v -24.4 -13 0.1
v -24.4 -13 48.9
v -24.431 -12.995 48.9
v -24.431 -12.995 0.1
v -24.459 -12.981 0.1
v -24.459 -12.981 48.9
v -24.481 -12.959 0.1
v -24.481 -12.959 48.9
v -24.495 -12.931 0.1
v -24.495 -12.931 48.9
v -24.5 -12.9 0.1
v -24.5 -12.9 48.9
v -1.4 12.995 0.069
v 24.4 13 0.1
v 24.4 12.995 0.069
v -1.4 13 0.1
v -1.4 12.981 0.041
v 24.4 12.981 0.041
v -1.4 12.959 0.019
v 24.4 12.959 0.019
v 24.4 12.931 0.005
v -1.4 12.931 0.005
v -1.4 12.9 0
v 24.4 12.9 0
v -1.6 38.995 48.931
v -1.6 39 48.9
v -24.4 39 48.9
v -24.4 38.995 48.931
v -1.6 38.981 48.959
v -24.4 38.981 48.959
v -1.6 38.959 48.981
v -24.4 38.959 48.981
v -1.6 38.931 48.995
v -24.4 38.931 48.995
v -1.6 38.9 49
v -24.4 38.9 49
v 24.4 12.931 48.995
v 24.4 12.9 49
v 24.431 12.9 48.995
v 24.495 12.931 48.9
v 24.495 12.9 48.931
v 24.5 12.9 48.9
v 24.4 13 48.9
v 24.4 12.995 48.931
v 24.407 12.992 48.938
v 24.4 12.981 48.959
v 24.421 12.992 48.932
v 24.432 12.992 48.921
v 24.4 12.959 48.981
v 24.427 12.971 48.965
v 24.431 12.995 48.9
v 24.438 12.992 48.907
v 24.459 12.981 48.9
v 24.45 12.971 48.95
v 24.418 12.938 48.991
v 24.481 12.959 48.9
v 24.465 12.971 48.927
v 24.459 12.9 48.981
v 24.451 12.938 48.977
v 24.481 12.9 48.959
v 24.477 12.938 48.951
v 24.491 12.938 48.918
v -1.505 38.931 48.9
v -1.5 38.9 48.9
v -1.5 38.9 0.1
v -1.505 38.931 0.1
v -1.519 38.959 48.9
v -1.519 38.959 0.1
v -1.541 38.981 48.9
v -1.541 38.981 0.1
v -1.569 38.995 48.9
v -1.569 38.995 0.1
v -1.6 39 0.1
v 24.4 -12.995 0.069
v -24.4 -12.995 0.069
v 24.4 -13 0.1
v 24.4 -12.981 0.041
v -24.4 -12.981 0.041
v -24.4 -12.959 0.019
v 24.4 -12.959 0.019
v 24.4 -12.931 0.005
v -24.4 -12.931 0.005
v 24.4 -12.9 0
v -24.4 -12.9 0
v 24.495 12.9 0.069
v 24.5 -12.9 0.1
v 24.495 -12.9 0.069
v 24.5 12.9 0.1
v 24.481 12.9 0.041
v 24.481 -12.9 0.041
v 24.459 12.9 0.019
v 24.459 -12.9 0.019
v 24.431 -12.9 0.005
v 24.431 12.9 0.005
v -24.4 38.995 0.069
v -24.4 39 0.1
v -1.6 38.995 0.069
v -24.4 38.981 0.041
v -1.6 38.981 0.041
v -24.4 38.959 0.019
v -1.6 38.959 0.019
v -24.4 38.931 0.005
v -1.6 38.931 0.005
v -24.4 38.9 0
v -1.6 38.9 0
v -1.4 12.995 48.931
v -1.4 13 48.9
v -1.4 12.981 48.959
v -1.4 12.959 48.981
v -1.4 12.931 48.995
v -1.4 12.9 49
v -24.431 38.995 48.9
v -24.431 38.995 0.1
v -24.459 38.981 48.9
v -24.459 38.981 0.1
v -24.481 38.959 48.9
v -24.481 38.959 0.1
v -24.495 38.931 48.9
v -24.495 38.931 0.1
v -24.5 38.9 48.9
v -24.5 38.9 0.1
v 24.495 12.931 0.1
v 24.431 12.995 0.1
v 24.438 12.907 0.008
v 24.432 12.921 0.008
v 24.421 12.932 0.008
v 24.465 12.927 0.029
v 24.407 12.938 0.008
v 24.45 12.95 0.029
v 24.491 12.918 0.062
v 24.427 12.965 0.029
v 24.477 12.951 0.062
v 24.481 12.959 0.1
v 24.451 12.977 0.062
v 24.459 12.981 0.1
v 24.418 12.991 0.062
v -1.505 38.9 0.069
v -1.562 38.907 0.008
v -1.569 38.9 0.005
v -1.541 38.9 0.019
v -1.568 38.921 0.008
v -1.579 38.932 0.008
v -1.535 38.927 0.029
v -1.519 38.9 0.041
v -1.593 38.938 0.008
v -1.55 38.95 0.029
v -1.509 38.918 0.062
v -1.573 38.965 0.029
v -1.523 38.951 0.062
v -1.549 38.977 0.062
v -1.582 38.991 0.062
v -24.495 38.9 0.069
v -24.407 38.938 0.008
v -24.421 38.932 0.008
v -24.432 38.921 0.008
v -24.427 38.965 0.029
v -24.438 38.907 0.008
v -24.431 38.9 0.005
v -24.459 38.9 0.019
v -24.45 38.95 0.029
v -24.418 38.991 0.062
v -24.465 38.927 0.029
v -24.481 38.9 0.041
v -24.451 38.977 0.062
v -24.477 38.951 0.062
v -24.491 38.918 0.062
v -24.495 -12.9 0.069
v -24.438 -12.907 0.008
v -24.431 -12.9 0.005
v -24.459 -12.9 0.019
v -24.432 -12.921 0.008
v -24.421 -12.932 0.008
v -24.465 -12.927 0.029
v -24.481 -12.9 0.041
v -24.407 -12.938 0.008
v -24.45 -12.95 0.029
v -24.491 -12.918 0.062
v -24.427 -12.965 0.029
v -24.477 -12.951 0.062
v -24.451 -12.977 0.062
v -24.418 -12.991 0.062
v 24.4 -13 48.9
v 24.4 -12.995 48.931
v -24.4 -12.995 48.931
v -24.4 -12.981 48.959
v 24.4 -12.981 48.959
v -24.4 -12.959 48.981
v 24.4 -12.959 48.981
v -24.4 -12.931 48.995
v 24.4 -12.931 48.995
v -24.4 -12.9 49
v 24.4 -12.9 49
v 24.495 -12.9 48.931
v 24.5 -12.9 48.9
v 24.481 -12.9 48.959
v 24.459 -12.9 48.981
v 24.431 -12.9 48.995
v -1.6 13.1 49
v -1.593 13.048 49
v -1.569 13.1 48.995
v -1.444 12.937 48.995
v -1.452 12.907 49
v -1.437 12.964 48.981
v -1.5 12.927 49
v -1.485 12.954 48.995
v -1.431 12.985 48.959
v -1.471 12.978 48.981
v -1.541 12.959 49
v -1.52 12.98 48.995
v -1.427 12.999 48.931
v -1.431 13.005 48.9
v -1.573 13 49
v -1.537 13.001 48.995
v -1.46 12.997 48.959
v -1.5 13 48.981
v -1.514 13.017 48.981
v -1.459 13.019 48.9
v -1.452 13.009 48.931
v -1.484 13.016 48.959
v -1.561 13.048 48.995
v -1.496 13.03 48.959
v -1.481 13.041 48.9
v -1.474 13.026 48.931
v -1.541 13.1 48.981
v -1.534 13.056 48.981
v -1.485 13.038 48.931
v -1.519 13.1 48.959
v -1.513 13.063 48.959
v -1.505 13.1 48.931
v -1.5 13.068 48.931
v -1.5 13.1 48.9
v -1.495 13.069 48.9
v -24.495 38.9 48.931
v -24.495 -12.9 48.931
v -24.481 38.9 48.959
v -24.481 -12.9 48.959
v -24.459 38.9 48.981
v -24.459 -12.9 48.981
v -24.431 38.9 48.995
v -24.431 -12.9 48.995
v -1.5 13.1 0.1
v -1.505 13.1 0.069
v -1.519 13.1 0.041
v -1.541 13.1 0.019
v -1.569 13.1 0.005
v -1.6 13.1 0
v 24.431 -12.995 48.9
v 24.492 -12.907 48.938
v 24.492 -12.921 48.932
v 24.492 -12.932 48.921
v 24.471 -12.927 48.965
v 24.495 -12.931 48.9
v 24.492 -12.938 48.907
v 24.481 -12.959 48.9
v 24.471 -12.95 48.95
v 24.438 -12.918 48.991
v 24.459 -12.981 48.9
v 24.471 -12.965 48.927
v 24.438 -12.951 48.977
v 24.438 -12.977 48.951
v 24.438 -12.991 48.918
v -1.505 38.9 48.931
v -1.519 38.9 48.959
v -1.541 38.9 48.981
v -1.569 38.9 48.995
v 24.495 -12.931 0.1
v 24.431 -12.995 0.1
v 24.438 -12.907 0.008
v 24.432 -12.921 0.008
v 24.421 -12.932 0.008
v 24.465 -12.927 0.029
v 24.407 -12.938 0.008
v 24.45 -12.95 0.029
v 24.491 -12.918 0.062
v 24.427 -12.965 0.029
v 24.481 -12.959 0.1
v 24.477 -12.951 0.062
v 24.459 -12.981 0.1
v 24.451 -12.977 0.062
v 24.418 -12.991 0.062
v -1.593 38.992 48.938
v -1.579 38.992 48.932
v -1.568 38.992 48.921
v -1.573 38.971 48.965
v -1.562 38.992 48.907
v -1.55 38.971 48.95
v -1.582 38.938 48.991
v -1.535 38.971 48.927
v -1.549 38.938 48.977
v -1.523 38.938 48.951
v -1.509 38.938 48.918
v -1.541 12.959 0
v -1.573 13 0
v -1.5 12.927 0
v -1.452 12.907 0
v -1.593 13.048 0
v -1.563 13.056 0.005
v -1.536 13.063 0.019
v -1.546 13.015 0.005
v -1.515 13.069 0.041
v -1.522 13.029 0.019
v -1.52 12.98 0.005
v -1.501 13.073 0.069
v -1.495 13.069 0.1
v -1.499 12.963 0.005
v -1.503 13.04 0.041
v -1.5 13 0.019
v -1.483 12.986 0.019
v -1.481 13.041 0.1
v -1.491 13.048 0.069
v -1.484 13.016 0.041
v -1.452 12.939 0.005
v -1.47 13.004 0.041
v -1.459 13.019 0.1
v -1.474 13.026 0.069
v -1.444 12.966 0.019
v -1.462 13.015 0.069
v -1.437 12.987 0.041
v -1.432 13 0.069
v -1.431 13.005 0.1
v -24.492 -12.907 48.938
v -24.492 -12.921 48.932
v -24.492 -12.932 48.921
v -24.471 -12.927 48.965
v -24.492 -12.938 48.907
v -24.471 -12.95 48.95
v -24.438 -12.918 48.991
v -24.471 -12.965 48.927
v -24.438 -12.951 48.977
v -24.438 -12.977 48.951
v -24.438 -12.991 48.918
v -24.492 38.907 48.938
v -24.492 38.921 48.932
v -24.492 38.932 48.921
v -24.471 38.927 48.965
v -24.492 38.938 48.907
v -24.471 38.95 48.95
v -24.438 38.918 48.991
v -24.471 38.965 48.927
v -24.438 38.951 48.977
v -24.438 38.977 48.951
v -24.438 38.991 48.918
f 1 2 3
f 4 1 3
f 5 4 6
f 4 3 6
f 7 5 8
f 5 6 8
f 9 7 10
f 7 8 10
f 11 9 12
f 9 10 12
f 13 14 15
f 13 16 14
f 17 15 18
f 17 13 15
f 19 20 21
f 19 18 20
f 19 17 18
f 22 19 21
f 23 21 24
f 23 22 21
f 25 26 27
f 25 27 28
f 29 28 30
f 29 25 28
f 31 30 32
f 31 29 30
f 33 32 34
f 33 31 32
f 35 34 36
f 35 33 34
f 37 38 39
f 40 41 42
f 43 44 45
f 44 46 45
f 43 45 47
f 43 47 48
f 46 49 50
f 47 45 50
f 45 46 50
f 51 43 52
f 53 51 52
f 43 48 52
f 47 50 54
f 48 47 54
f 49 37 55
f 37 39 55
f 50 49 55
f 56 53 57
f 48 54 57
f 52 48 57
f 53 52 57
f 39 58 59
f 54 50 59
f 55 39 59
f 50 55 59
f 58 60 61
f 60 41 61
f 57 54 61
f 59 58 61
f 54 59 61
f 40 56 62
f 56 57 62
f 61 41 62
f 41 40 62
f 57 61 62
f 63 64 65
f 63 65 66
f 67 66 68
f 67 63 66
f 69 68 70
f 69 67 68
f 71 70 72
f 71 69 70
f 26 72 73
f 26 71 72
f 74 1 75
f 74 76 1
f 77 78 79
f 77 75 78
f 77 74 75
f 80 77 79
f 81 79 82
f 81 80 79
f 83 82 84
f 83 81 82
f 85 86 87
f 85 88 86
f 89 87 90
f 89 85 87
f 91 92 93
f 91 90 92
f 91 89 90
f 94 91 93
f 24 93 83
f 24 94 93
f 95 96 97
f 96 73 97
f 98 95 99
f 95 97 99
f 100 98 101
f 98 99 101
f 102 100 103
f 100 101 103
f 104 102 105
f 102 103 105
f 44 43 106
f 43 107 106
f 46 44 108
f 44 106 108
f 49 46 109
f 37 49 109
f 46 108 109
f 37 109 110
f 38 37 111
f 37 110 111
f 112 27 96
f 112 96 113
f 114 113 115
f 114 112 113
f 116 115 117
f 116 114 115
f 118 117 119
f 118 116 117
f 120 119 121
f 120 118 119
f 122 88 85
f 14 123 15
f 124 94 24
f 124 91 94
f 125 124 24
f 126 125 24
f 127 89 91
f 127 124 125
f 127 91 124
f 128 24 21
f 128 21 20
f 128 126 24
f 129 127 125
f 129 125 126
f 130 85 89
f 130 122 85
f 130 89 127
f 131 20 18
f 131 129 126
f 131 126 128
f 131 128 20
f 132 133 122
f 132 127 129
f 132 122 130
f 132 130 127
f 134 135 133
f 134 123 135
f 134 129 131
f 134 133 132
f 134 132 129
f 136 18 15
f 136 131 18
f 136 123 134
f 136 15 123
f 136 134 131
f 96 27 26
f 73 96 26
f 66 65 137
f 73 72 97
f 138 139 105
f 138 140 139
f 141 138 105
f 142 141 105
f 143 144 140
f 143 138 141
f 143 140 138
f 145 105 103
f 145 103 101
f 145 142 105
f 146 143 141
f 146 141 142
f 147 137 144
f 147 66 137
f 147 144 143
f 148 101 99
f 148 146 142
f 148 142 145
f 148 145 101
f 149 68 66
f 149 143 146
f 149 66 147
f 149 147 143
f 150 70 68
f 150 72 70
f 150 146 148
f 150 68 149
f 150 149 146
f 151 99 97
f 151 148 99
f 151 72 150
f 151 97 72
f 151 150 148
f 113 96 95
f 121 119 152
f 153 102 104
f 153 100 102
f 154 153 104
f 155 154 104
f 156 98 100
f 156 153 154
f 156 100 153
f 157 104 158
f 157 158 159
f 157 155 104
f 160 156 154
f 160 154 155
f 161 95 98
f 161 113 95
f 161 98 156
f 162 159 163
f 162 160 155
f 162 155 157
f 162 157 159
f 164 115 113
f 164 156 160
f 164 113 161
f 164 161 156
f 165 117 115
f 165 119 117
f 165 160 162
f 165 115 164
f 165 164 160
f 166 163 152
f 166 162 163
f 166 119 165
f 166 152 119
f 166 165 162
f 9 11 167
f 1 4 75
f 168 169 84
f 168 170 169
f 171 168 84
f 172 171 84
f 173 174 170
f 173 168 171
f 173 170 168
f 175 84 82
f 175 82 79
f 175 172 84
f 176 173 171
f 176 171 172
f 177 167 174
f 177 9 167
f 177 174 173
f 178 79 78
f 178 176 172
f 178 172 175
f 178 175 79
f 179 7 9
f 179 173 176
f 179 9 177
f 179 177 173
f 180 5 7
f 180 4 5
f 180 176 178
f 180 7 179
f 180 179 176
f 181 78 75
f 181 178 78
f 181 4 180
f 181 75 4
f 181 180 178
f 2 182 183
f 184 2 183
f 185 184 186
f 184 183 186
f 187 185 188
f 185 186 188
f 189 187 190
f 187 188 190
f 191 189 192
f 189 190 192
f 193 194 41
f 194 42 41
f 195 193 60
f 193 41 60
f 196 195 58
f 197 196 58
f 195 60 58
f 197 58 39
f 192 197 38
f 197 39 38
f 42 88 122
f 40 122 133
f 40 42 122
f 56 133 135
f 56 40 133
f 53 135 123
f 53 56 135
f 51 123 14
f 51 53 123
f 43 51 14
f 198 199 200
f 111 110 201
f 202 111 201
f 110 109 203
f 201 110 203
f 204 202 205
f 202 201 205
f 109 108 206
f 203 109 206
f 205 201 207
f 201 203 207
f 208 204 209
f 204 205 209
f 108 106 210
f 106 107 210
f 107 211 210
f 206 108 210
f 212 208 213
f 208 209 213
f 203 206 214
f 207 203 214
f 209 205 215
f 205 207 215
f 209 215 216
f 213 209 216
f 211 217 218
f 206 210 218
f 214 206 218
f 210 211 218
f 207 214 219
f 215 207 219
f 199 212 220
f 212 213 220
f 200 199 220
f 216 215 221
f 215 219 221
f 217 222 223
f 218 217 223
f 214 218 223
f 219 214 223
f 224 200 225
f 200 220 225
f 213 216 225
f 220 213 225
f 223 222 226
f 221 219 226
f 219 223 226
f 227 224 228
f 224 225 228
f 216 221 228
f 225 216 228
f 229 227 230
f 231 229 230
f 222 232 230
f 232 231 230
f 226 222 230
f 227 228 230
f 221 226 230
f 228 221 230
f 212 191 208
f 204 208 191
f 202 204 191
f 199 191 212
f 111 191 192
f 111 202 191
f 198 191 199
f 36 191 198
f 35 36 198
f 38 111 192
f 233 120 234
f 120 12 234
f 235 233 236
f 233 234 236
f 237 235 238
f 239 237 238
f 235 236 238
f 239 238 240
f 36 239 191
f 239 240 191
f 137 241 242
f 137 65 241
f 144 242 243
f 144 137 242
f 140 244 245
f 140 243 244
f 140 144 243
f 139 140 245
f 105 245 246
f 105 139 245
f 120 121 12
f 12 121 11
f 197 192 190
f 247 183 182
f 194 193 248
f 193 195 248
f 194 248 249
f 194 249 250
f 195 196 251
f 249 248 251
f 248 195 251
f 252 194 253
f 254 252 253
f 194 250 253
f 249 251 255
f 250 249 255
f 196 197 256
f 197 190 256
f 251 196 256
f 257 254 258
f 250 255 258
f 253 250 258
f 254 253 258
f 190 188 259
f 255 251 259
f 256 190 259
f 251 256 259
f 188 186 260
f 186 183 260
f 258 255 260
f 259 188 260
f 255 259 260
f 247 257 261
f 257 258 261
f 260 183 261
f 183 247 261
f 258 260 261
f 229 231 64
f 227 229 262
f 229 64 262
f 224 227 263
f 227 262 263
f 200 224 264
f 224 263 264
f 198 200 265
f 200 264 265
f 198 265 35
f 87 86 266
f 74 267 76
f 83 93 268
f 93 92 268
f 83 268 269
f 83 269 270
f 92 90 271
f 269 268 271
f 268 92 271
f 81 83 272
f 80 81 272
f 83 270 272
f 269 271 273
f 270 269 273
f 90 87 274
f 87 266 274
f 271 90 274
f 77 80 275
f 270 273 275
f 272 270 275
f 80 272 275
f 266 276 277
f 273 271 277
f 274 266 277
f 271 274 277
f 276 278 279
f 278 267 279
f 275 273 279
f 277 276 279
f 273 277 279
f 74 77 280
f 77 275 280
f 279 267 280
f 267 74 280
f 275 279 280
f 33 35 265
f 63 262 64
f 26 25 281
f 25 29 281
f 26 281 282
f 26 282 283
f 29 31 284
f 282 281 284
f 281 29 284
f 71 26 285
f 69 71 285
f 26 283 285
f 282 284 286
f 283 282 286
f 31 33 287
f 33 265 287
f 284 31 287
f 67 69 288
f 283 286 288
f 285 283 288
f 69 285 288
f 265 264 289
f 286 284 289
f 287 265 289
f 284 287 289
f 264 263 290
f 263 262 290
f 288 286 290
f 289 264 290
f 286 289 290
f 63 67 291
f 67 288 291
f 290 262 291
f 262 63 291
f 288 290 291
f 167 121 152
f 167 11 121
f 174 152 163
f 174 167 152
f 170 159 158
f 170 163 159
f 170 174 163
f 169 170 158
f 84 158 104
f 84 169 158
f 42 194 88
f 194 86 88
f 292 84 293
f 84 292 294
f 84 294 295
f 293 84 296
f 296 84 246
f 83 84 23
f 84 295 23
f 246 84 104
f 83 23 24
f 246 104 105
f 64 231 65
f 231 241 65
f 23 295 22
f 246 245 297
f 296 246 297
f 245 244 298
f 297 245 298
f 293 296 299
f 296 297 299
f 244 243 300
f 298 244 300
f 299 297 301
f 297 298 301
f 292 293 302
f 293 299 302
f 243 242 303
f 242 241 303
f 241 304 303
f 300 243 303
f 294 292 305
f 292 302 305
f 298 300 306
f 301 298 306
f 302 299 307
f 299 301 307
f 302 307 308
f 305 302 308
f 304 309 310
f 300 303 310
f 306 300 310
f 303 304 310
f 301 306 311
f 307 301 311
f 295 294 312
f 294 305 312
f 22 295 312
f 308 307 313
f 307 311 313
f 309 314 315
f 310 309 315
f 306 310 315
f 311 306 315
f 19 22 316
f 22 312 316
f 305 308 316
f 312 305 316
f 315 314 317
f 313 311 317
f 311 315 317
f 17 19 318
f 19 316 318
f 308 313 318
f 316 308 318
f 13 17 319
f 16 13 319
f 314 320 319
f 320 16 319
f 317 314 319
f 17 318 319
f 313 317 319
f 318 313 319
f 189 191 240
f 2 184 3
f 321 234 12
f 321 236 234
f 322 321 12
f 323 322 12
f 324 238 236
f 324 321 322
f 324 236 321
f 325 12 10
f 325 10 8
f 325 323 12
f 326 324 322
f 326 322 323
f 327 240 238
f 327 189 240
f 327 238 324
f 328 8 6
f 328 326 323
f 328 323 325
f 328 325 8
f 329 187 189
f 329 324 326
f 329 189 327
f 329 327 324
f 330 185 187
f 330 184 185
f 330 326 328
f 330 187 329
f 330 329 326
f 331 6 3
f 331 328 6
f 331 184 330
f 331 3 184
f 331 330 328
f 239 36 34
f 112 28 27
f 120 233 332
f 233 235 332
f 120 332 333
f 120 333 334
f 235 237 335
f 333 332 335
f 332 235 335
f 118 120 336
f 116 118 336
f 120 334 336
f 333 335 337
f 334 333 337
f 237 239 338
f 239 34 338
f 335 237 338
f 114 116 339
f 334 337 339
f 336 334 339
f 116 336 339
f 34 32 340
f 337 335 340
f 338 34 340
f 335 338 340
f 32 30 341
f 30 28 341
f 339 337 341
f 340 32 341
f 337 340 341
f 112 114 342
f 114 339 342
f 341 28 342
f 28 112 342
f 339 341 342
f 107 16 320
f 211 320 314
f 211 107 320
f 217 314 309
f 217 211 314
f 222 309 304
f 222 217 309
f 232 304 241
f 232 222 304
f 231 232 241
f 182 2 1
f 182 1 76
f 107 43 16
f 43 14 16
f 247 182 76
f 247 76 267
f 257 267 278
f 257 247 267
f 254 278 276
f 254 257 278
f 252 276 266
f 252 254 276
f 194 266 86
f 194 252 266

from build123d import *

# Parameters (mm, degrees)
F0_W     = 23
F0_H     = 26
F1_DEPTH = 49
F2_R     = 0.1


with BuildPart() as f1:
    # F0 (on Top) → F1 (new body)
    with BuildSketch(Plane.XY):
        Polygon((-24.5, -13), (24.5, -13), (24.5, 13), (-1.5, 13), (-24.5, 13), align=None)
        with Locations((-13, 26)):
            Rectangle(F0_W, F0_H)
    extrude(amount=F1_DEPTH)

    # F2
    f2_edges = [f1.edges().sort_by_distance(p)[0] for p in [
        (0, -13, 49),
        (24.5, 0, 49),
        (11.5, 13, 49),
        (-1.5, 26, 49),
        (-13, 39, 49),
        (-24.5, 13, 49),
        (24.5, -13, 24.5),
        (24.5, 13, 24.5),
        (24.5, 0, 0),
        (11.5, 13, 0),
        (-1.5, 13, 24.5),
        (-1.5, 39, 24.5),
        (-1.5, 26, 0),
        (-24.5, 39, 24.5),
        (-13, 39, 0),
        (-24.5, -13, 24.5),
        (-24.5, 13, 0),
        (0, -13, 0),
    ]]
    fillet(f2_edges, radius=F2_R)


solid = f1.part
